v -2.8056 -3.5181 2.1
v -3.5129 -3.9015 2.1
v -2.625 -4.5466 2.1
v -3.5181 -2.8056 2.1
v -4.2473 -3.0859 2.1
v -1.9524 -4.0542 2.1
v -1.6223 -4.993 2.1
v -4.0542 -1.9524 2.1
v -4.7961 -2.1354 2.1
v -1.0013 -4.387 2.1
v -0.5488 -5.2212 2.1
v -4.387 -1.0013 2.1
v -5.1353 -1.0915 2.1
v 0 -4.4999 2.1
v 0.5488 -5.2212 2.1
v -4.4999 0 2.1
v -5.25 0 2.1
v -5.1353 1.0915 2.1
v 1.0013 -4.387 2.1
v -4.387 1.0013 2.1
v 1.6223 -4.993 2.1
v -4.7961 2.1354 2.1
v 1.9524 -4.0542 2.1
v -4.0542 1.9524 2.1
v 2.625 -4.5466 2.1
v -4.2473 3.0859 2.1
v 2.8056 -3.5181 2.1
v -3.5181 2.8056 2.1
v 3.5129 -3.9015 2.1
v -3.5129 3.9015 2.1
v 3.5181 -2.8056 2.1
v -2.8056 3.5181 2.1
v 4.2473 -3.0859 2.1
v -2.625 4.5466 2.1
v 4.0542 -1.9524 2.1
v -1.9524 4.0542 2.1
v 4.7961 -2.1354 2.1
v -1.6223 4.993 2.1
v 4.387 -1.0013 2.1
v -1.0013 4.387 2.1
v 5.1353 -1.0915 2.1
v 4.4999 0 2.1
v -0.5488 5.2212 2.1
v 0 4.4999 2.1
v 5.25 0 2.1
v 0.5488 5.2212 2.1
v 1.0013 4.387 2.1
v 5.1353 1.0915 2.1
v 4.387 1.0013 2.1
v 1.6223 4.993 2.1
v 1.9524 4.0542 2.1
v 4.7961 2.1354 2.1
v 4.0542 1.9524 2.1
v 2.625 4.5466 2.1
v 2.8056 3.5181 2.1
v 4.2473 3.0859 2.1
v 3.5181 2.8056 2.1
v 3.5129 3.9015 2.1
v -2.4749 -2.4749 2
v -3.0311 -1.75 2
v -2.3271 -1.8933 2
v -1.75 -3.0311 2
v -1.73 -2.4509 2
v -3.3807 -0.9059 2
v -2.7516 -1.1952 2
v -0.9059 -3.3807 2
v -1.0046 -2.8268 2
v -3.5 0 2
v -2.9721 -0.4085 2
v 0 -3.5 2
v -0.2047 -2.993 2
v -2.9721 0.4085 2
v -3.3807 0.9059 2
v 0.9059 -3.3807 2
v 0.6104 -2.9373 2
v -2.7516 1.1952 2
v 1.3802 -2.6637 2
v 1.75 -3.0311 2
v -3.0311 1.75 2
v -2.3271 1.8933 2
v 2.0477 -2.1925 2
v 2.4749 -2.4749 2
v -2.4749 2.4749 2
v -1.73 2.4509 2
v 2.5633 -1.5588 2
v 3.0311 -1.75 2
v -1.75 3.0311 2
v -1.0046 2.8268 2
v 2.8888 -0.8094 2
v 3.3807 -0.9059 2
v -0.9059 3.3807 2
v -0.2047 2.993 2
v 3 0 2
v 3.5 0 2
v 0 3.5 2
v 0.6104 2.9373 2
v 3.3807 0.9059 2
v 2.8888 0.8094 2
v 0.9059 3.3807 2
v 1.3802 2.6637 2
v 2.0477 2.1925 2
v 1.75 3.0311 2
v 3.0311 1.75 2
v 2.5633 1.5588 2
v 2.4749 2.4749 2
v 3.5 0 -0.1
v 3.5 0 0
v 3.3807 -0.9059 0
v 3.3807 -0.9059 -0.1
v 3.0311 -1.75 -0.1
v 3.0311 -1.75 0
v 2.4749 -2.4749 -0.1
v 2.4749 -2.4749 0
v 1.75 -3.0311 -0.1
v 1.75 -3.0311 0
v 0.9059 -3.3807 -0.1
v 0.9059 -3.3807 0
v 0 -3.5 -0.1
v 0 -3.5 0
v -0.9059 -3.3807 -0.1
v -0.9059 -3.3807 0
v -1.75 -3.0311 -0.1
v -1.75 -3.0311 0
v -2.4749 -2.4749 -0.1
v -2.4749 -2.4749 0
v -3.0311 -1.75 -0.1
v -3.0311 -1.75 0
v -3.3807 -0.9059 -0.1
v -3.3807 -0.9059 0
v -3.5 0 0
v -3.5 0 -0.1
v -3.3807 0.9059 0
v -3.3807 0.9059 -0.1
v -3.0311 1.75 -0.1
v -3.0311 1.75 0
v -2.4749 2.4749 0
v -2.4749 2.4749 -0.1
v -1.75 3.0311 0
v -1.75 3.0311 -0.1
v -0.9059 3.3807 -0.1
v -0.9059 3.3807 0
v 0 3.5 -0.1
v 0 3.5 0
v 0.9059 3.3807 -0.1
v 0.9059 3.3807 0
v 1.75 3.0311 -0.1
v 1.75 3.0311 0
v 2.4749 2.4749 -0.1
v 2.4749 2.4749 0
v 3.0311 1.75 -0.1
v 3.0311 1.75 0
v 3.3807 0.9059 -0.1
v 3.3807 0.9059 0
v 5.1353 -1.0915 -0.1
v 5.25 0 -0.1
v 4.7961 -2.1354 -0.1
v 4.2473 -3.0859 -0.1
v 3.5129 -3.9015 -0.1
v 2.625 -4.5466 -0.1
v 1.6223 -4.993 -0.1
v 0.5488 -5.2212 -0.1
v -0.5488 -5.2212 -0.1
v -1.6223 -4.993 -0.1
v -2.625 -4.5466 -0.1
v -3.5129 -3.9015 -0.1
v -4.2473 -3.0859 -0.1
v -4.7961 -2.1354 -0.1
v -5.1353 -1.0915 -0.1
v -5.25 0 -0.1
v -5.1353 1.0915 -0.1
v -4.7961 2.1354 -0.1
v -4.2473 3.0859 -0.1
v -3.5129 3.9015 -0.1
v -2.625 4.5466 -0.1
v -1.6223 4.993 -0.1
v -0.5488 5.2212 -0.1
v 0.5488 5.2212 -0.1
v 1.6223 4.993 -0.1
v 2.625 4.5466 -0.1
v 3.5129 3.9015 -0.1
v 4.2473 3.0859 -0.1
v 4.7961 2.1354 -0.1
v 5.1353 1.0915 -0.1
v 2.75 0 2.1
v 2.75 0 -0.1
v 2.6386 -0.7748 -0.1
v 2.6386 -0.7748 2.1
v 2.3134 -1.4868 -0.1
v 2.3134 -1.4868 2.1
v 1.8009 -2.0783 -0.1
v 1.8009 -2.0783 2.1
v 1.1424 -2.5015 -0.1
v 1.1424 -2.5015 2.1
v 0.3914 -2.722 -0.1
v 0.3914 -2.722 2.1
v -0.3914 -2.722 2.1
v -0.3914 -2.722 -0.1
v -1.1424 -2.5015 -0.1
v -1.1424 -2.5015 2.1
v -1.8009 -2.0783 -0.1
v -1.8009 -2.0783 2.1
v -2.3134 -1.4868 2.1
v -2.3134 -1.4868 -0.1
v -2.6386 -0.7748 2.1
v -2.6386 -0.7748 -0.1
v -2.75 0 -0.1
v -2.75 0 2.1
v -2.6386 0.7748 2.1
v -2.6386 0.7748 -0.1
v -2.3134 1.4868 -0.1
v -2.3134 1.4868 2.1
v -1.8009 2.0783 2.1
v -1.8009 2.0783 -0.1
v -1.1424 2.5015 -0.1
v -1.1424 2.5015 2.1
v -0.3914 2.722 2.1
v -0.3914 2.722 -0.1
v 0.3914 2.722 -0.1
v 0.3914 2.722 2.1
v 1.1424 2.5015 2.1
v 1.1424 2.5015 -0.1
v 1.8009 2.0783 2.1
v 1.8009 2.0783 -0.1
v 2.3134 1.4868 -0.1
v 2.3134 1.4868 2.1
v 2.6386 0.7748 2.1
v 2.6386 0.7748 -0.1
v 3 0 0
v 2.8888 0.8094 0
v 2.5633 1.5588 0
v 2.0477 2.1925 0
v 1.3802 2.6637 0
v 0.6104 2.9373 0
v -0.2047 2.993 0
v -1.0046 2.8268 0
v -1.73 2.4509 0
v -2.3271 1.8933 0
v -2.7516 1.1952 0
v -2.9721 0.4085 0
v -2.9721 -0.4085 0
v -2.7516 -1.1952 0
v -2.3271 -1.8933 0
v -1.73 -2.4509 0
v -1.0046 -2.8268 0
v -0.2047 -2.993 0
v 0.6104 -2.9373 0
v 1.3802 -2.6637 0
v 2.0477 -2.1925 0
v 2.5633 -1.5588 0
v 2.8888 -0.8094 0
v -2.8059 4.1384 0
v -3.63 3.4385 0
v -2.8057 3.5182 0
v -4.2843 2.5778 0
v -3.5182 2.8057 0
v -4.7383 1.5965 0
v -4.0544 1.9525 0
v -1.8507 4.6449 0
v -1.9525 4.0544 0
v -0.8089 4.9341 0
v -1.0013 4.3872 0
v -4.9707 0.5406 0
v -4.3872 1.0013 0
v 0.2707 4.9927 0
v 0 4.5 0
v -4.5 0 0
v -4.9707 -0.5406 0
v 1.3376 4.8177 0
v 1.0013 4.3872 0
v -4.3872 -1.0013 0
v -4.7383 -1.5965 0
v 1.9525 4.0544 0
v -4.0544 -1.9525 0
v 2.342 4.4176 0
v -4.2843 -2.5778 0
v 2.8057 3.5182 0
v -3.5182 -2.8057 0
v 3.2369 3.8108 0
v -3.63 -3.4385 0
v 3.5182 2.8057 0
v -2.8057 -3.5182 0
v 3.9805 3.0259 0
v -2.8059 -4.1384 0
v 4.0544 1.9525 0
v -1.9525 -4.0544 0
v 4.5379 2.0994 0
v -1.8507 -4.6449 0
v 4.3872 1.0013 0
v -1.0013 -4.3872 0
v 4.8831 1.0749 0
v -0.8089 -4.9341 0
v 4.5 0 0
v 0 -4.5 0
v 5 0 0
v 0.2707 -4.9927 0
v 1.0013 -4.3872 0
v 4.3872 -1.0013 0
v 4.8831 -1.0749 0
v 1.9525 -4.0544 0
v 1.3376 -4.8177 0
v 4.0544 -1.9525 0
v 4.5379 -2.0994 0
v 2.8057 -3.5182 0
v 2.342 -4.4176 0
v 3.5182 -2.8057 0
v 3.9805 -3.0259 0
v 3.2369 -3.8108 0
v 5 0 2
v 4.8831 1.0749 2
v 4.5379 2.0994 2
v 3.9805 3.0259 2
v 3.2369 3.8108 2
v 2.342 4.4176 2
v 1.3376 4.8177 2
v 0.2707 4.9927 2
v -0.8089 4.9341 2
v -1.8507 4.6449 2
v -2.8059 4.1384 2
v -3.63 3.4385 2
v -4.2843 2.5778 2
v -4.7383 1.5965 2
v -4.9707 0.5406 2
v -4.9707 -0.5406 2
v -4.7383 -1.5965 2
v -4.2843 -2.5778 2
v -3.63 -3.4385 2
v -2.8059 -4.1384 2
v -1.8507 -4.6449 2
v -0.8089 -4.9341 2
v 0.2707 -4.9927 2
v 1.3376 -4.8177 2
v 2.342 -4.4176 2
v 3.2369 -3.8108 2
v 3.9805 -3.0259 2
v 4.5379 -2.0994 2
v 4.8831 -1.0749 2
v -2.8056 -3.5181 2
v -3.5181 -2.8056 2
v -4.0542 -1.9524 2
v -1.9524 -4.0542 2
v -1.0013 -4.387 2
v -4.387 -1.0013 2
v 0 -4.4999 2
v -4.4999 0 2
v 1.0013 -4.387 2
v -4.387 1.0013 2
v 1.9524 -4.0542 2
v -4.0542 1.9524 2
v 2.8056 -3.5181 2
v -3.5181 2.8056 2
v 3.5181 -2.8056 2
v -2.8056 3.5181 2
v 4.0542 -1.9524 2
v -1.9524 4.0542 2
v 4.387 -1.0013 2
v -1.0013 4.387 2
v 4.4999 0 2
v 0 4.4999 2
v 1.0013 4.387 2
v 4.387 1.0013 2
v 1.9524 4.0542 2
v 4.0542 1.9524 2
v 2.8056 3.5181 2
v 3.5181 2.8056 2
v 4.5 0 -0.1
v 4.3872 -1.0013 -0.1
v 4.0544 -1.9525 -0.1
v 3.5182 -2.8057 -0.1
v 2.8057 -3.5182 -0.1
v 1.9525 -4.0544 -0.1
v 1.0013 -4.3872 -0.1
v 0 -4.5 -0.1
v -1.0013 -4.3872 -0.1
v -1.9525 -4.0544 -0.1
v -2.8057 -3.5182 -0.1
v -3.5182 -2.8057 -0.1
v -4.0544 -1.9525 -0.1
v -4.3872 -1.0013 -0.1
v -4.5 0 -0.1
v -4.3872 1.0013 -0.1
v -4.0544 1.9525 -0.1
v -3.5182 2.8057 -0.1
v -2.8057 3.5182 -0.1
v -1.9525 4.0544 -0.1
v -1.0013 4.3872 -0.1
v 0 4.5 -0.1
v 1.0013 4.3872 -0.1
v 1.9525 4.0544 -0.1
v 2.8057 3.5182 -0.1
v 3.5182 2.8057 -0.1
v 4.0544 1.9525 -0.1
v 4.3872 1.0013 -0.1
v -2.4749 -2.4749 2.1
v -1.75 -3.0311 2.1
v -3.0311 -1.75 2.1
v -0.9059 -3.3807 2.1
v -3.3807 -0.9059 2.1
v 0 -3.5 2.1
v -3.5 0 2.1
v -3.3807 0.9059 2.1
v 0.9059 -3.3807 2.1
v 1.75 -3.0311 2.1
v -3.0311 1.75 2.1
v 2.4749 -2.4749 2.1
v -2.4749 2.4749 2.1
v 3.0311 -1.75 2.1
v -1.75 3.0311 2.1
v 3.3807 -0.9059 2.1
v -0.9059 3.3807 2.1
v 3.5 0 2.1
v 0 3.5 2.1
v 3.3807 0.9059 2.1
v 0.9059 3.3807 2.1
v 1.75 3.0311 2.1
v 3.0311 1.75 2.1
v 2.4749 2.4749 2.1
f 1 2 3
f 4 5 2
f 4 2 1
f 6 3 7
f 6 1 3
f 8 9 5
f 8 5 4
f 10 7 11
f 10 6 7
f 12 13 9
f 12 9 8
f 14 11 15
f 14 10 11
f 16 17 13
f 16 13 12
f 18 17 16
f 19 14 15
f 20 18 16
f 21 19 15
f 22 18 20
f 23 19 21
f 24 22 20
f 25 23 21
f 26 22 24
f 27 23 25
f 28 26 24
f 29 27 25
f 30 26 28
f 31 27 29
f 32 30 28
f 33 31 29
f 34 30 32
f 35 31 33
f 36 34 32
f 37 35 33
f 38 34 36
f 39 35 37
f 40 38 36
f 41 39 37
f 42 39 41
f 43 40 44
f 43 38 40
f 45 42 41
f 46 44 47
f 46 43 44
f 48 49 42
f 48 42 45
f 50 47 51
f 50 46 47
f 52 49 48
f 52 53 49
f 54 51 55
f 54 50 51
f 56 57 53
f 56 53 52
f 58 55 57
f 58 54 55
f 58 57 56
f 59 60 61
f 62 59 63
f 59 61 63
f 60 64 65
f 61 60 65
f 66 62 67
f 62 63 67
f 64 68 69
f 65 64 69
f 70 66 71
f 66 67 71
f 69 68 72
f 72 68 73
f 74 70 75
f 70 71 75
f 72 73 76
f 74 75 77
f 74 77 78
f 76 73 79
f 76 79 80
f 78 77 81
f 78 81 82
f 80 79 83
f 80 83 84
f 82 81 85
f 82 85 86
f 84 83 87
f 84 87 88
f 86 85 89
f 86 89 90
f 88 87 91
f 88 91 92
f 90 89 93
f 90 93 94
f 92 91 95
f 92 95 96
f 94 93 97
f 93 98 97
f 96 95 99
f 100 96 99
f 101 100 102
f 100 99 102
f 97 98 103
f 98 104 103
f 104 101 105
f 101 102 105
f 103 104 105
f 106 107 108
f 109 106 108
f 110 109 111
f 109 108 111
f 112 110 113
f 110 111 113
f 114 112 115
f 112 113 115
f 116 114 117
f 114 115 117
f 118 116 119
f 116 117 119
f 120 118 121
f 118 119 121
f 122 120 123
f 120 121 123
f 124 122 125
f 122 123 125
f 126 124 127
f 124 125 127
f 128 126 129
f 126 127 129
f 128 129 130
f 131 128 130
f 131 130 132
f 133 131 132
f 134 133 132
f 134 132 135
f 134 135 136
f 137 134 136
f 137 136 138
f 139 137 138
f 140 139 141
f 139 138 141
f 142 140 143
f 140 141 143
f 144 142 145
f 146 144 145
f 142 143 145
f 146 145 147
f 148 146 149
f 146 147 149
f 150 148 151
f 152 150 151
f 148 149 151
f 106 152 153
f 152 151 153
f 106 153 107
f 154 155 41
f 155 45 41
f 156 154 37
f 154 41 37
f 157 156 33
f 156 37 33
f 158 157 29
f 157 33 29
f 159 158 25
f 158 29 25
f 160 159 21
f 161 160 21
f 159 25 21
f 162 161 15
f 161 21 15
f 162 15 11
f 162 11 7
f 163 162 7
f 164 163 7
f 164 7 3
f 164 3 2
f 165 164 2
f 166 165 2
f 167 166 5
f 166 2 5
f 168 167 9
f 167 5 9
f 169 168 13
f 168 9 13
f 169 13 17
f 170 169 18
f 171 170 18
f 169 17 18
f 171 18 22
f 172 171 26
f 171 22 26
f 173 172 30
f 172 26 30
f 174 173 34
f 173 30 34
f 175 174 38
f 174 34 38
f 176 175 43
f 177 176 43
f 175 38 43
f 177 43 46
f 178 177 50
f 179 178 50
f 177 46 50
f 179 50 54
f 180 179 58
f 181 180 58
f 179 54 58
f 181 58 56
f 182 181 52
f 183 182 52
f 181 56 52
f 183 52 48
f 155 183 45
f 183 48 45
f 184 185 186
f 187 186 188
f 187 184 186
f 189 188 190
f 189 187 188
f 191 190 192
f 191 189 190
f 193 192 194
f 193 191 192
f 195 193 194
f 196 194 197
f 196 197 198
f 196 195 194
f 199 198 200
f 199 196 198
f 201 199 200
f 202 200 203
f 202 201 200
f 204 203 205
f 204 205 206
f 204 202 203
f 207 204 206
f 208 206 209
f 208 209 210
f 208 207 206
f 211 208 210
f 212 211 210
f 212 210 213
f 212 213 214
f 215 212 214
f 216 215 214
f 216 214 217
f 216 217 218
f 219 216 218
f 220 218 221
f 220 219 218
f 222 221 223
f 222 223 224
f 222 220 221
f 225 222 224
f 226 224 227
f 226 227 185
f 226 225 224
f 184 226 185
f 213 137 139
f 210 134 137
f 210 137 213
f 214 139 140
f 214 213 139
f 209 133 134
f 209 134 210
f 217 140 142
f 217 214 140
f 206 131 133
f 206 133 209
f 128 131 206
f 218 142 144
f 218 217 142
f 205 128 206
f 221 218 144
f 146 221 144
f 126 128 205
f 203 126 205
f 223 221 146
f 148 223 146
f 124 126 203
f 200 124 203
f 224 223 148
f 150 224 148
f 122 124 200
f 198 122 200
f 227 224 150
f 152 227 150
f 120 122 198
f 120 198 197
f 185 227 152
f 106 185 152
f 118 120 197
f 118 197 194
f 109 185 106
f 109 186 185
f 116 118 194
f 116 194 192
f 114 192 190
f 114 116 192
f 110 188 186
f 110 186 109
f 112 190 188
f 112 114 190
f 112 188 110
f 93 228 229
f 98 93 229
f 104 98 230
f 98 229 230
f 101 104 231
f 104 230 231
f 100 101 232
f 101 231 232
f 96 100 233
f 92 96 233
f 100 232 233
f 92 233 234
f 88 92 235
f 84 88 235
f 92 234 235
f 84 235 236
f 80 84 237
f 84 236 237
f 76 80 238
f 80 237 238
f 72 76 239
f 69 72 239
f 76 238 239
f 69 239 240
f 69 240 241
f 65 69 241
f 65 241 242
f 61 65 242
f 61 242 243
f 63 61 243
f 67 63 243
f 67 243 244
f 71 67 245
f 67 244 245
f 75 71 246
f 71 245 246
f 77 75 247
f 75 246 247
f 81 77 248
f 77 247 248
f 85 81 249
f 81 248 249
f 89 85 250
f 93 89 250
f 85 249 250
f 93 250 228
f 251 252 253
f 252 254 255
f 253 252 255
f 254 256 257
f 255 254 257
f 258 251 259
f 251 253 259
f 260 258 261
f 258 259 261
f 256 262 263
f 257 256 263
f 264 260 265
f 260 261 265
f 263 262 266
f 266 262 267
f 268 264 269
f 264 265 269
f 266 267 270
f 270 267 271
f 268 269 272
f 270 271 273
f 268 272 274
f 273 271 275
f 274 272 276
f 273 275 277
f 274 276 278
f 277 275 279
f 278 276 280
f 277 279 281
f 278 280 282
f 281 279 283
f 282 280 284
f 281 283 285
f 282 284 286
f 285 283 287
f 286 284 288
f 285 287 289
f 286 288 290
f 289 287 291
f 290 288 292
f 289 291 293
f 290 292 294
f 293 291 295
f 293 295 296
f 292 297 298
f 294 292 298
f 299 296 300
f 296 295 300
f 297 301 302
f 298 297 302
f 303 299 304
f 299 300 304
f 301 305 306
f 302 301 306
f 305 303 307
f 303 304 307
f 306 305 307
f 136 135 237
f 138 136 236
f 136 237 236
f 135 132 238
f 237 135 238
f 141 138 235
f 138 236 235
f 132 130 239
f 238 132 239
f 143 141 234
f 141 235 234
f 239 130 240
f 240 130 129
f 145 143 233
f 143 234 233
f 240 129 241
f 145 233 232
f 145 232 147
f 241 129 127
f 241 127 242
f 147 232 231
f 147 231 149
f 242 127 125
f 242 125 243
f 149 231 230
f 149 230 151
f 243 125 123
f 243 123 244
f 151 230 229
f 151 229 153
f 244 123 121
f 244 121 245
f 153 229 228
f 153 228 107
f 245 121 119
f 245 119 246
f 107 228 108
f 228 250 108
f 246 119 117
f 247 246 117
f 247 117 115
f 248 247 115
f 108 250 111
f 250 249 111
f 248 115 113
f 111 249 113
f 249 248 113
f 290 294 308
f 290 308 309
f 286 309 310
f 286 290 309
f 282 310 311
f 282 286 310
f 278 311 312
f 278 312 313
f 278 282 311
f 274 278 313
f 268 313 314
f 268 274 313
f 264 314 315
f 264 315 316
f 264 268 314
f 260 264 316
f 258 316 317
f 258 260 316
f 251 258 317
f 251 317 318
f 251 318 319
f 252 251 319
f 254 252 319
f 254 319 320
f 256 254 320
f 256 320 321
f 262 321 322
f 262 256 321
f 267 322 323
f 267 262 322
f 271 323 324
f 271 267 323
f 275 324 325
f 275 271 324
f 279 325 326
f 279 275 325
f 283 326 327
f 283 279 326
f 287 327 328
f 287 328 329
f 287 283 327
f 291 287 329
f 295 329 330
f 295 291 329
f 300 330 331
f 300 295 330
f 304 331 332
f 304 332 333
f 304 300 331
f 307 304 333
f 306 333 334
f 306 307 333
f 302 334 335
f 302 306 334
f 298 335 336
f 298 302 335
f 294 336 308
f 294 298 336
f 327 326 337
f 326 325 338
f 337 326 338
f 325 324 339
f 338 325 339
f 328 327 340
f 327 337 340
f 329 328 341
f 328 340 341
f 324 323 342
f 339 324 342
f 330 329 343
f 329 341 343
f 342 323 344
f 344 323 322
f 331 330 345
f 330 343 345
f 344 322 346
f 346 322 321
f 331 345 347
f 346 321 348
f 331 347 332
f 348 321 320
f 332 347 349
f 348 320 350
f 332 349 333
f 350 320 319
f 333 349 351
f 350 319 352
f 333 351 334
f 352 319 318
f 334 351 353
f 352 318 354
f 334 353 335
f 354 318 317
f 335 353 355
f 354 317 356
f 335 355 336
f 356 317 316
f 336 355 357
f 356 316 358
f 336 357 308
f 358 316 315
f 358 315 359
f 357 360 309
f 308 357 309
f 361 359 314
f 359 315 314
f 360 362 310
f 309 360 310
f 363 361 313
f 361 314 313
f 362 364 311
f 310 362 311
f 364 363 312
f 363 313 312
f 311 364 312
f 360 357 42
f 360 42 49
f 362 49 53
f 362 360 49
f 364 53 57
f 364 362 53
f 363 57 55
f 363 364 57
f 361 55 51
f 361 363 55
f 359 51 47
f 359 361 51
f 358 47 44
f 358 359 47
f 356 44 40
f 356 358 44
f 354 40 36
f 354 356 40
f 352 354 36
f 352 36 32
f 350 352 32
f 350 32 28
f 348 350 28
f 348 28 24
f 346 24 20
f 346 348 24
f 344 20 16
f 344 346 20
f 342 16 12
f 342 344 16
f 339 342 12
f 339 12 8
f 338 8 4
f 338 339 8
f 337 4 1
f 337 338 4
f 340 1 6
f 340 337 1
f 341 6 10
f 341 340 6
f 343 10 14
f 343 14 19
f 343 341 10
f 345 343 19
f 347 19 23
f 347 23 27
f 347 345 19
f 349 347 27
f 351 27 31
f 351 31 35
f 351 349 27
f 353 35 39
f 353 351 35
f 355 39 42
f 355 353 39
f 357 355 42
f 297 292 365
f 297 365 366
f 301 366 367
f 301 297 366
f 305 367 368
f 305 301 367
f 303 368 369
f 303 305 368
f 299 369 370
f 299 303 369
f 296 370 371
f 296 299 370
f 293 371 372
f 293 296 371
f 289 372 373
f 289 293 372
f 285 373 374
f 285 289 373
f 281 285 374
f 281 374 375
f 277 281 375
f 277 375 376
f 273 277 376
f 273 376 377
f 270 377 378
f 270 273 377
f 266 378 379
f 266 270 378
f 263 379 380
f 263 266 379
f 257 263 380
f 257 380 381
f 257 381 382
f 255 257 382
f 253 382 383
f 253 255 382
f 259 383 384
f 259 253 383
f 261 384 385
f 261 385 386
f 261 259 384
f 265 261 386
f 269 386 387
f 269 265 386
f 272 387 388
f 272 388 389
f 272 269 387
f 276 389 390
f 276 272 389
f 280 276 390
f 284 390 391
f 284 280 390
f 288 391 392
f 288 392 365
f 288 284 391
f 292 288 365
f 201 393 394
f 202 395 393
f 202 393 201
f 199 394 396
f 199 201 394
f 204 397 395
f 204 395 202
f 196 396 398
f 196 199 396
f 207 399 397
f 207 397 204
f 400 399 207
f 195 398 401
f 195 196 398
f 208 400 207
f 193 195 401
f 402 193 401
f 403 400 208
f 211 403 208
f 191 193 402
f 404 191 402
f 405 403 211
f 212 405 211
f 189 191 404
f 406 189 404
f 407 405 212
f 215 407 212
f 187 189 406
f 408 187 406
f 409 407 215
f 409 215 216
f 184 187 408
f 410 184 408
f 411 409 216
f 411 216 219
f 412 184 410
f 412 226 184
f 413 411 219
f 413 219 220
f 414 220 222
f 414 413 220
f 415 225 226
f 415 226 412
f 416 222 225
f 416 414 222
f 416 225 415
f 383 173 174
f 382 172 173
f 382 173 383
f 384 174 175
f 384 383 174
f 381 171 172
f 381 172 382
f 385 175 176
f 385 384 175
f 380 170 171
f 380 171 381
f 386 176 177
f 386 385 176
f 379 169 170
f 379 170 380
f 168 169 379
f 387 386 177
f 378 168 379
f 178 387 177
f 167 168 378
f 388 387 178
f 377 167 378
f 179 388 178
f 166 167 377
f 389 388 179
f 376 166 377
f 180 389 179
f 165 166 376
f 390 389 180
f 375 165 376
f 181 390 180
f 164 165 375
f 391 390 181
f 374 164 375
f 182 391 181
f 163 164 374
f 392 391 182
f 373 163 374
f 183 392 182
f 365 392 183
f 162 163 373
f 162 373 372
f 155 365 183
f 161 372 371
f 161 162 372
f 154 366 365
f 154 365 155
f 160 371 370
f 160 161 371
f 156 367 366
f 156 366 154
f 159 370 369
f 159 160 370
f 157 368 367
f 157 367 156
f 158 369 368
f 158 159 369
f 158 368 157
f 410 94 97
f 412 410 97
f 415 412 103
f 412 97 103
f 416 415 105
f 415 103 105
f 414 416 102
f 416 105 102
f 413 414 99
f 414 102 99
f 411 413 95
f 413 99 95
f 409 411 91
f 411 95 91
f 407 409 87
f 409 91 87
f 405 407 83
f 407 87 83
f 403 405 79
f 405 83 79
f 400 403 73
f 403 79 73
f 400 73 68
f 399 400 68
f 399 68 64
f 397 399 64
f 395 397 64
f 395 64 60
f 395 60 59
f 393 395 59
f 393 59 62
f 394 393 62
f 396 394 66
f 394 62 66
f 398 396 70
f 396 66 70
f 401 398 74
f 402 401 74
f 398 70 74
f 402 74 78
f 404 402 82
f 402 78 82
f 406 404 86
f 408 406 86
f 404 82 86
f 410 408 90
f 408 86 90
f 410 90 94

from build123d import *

# Parameters (mm, degrees)
F0_R      = 5.25
F0_R_2    = 5
F1_DEPTH  = 2
F0_R_3    = 3
F0_R_4    = 2.75
F7_R      = 5.25
F7_R_2    = 5
F7_R_3    = 4.4998566685
F8_DEPTH  = 0.1
F7_R_4    = 3.5
F7_R_5    = 3
F7_R_6    = 2.75
F9_R      = 3.5
F9_R_2    = 3
F9_R_3    = 2.75
F10_DEPTH = 0.1
F9_R_4    = 5.25
F9_R_5    = 4.5


# Not quite as in the source:
# - a feature of the source that left no trace in its solid (it failed there, or was rolled back) is left out
# - the program builds the solid bodies; features that only make, move or delete a surface that nothing else refers to are left out


with BuildPart() as f1:
    # F0 (on Top) → F1 (new body)
    with BuildSketch(Plane.XY):
        Circle(F0_R)
        Circle(F0_R_2, mode=Mode.SUBTRACT)
    extrude(amount=F1_DEPTH)

    # F7 (on face) → F8 (join)
    with BuildSketch(Plane.XY.offset(2)):
        Circle(F7_R)
        Circle(F7_R_2, mode=Mode.SUBTRACT)
        Circle(F7_R_2)
        Circle(F7_R_3, mode=Mode.SUBTRACT)
    extrude(amount=F8_DEPTH)

    # F9 (on face) → F10, piece 2 (join)
    with BuildSketch(Plane(origin=(0, 0, 0), x_dir=(1, 0, 0), z_dir=(0, 0, -1))):
        Circle(F9_R_4)
        Circle(F9_R_5, mode=Mode.SUBTRACT)
    extrude(amount=F10_DEPTH)


with BuildPart() as f1b:
    # F0 (on Top) → F1, piece 2 (new body)
    with BuildSketch(Plane.XY):
        Circle(F0_R_3)
        Circle(F0_R_4, mode=Mode.SUBTRACT)
    extrude(amount=F1_DEPTH)

    # F7 (on face) → F8, piece 2 (join)
    with BuildSketch(Plane.XY.offset(2)):
        Circle(F7_R_4)
        Circle(F7_R_5, mode=Mode.SUBTRACT)
        Circle(F7_R_5)
        Circle(F7_R_6, mode=Mode.SUBTRACT)
    extrude(amount=F8_DEPTH)

    # F9 (on face) → F10 (join)
    with BuildSketch(Plane(origin=(0, 0, 0), x_dir=(1, 0, 0), z_dir=(0, 0, -1))):
        Circle(F9_R)
        Circle(F9_R_2, mode=Mode.SUBTRACT)
        Circle(F9_R_2)
        Circle(F9_R_3, mode=Mode.SUBTRACT)
    extrude(amount=F10_DEPTH)


solid = Compound([f1.part, f1b.part])
